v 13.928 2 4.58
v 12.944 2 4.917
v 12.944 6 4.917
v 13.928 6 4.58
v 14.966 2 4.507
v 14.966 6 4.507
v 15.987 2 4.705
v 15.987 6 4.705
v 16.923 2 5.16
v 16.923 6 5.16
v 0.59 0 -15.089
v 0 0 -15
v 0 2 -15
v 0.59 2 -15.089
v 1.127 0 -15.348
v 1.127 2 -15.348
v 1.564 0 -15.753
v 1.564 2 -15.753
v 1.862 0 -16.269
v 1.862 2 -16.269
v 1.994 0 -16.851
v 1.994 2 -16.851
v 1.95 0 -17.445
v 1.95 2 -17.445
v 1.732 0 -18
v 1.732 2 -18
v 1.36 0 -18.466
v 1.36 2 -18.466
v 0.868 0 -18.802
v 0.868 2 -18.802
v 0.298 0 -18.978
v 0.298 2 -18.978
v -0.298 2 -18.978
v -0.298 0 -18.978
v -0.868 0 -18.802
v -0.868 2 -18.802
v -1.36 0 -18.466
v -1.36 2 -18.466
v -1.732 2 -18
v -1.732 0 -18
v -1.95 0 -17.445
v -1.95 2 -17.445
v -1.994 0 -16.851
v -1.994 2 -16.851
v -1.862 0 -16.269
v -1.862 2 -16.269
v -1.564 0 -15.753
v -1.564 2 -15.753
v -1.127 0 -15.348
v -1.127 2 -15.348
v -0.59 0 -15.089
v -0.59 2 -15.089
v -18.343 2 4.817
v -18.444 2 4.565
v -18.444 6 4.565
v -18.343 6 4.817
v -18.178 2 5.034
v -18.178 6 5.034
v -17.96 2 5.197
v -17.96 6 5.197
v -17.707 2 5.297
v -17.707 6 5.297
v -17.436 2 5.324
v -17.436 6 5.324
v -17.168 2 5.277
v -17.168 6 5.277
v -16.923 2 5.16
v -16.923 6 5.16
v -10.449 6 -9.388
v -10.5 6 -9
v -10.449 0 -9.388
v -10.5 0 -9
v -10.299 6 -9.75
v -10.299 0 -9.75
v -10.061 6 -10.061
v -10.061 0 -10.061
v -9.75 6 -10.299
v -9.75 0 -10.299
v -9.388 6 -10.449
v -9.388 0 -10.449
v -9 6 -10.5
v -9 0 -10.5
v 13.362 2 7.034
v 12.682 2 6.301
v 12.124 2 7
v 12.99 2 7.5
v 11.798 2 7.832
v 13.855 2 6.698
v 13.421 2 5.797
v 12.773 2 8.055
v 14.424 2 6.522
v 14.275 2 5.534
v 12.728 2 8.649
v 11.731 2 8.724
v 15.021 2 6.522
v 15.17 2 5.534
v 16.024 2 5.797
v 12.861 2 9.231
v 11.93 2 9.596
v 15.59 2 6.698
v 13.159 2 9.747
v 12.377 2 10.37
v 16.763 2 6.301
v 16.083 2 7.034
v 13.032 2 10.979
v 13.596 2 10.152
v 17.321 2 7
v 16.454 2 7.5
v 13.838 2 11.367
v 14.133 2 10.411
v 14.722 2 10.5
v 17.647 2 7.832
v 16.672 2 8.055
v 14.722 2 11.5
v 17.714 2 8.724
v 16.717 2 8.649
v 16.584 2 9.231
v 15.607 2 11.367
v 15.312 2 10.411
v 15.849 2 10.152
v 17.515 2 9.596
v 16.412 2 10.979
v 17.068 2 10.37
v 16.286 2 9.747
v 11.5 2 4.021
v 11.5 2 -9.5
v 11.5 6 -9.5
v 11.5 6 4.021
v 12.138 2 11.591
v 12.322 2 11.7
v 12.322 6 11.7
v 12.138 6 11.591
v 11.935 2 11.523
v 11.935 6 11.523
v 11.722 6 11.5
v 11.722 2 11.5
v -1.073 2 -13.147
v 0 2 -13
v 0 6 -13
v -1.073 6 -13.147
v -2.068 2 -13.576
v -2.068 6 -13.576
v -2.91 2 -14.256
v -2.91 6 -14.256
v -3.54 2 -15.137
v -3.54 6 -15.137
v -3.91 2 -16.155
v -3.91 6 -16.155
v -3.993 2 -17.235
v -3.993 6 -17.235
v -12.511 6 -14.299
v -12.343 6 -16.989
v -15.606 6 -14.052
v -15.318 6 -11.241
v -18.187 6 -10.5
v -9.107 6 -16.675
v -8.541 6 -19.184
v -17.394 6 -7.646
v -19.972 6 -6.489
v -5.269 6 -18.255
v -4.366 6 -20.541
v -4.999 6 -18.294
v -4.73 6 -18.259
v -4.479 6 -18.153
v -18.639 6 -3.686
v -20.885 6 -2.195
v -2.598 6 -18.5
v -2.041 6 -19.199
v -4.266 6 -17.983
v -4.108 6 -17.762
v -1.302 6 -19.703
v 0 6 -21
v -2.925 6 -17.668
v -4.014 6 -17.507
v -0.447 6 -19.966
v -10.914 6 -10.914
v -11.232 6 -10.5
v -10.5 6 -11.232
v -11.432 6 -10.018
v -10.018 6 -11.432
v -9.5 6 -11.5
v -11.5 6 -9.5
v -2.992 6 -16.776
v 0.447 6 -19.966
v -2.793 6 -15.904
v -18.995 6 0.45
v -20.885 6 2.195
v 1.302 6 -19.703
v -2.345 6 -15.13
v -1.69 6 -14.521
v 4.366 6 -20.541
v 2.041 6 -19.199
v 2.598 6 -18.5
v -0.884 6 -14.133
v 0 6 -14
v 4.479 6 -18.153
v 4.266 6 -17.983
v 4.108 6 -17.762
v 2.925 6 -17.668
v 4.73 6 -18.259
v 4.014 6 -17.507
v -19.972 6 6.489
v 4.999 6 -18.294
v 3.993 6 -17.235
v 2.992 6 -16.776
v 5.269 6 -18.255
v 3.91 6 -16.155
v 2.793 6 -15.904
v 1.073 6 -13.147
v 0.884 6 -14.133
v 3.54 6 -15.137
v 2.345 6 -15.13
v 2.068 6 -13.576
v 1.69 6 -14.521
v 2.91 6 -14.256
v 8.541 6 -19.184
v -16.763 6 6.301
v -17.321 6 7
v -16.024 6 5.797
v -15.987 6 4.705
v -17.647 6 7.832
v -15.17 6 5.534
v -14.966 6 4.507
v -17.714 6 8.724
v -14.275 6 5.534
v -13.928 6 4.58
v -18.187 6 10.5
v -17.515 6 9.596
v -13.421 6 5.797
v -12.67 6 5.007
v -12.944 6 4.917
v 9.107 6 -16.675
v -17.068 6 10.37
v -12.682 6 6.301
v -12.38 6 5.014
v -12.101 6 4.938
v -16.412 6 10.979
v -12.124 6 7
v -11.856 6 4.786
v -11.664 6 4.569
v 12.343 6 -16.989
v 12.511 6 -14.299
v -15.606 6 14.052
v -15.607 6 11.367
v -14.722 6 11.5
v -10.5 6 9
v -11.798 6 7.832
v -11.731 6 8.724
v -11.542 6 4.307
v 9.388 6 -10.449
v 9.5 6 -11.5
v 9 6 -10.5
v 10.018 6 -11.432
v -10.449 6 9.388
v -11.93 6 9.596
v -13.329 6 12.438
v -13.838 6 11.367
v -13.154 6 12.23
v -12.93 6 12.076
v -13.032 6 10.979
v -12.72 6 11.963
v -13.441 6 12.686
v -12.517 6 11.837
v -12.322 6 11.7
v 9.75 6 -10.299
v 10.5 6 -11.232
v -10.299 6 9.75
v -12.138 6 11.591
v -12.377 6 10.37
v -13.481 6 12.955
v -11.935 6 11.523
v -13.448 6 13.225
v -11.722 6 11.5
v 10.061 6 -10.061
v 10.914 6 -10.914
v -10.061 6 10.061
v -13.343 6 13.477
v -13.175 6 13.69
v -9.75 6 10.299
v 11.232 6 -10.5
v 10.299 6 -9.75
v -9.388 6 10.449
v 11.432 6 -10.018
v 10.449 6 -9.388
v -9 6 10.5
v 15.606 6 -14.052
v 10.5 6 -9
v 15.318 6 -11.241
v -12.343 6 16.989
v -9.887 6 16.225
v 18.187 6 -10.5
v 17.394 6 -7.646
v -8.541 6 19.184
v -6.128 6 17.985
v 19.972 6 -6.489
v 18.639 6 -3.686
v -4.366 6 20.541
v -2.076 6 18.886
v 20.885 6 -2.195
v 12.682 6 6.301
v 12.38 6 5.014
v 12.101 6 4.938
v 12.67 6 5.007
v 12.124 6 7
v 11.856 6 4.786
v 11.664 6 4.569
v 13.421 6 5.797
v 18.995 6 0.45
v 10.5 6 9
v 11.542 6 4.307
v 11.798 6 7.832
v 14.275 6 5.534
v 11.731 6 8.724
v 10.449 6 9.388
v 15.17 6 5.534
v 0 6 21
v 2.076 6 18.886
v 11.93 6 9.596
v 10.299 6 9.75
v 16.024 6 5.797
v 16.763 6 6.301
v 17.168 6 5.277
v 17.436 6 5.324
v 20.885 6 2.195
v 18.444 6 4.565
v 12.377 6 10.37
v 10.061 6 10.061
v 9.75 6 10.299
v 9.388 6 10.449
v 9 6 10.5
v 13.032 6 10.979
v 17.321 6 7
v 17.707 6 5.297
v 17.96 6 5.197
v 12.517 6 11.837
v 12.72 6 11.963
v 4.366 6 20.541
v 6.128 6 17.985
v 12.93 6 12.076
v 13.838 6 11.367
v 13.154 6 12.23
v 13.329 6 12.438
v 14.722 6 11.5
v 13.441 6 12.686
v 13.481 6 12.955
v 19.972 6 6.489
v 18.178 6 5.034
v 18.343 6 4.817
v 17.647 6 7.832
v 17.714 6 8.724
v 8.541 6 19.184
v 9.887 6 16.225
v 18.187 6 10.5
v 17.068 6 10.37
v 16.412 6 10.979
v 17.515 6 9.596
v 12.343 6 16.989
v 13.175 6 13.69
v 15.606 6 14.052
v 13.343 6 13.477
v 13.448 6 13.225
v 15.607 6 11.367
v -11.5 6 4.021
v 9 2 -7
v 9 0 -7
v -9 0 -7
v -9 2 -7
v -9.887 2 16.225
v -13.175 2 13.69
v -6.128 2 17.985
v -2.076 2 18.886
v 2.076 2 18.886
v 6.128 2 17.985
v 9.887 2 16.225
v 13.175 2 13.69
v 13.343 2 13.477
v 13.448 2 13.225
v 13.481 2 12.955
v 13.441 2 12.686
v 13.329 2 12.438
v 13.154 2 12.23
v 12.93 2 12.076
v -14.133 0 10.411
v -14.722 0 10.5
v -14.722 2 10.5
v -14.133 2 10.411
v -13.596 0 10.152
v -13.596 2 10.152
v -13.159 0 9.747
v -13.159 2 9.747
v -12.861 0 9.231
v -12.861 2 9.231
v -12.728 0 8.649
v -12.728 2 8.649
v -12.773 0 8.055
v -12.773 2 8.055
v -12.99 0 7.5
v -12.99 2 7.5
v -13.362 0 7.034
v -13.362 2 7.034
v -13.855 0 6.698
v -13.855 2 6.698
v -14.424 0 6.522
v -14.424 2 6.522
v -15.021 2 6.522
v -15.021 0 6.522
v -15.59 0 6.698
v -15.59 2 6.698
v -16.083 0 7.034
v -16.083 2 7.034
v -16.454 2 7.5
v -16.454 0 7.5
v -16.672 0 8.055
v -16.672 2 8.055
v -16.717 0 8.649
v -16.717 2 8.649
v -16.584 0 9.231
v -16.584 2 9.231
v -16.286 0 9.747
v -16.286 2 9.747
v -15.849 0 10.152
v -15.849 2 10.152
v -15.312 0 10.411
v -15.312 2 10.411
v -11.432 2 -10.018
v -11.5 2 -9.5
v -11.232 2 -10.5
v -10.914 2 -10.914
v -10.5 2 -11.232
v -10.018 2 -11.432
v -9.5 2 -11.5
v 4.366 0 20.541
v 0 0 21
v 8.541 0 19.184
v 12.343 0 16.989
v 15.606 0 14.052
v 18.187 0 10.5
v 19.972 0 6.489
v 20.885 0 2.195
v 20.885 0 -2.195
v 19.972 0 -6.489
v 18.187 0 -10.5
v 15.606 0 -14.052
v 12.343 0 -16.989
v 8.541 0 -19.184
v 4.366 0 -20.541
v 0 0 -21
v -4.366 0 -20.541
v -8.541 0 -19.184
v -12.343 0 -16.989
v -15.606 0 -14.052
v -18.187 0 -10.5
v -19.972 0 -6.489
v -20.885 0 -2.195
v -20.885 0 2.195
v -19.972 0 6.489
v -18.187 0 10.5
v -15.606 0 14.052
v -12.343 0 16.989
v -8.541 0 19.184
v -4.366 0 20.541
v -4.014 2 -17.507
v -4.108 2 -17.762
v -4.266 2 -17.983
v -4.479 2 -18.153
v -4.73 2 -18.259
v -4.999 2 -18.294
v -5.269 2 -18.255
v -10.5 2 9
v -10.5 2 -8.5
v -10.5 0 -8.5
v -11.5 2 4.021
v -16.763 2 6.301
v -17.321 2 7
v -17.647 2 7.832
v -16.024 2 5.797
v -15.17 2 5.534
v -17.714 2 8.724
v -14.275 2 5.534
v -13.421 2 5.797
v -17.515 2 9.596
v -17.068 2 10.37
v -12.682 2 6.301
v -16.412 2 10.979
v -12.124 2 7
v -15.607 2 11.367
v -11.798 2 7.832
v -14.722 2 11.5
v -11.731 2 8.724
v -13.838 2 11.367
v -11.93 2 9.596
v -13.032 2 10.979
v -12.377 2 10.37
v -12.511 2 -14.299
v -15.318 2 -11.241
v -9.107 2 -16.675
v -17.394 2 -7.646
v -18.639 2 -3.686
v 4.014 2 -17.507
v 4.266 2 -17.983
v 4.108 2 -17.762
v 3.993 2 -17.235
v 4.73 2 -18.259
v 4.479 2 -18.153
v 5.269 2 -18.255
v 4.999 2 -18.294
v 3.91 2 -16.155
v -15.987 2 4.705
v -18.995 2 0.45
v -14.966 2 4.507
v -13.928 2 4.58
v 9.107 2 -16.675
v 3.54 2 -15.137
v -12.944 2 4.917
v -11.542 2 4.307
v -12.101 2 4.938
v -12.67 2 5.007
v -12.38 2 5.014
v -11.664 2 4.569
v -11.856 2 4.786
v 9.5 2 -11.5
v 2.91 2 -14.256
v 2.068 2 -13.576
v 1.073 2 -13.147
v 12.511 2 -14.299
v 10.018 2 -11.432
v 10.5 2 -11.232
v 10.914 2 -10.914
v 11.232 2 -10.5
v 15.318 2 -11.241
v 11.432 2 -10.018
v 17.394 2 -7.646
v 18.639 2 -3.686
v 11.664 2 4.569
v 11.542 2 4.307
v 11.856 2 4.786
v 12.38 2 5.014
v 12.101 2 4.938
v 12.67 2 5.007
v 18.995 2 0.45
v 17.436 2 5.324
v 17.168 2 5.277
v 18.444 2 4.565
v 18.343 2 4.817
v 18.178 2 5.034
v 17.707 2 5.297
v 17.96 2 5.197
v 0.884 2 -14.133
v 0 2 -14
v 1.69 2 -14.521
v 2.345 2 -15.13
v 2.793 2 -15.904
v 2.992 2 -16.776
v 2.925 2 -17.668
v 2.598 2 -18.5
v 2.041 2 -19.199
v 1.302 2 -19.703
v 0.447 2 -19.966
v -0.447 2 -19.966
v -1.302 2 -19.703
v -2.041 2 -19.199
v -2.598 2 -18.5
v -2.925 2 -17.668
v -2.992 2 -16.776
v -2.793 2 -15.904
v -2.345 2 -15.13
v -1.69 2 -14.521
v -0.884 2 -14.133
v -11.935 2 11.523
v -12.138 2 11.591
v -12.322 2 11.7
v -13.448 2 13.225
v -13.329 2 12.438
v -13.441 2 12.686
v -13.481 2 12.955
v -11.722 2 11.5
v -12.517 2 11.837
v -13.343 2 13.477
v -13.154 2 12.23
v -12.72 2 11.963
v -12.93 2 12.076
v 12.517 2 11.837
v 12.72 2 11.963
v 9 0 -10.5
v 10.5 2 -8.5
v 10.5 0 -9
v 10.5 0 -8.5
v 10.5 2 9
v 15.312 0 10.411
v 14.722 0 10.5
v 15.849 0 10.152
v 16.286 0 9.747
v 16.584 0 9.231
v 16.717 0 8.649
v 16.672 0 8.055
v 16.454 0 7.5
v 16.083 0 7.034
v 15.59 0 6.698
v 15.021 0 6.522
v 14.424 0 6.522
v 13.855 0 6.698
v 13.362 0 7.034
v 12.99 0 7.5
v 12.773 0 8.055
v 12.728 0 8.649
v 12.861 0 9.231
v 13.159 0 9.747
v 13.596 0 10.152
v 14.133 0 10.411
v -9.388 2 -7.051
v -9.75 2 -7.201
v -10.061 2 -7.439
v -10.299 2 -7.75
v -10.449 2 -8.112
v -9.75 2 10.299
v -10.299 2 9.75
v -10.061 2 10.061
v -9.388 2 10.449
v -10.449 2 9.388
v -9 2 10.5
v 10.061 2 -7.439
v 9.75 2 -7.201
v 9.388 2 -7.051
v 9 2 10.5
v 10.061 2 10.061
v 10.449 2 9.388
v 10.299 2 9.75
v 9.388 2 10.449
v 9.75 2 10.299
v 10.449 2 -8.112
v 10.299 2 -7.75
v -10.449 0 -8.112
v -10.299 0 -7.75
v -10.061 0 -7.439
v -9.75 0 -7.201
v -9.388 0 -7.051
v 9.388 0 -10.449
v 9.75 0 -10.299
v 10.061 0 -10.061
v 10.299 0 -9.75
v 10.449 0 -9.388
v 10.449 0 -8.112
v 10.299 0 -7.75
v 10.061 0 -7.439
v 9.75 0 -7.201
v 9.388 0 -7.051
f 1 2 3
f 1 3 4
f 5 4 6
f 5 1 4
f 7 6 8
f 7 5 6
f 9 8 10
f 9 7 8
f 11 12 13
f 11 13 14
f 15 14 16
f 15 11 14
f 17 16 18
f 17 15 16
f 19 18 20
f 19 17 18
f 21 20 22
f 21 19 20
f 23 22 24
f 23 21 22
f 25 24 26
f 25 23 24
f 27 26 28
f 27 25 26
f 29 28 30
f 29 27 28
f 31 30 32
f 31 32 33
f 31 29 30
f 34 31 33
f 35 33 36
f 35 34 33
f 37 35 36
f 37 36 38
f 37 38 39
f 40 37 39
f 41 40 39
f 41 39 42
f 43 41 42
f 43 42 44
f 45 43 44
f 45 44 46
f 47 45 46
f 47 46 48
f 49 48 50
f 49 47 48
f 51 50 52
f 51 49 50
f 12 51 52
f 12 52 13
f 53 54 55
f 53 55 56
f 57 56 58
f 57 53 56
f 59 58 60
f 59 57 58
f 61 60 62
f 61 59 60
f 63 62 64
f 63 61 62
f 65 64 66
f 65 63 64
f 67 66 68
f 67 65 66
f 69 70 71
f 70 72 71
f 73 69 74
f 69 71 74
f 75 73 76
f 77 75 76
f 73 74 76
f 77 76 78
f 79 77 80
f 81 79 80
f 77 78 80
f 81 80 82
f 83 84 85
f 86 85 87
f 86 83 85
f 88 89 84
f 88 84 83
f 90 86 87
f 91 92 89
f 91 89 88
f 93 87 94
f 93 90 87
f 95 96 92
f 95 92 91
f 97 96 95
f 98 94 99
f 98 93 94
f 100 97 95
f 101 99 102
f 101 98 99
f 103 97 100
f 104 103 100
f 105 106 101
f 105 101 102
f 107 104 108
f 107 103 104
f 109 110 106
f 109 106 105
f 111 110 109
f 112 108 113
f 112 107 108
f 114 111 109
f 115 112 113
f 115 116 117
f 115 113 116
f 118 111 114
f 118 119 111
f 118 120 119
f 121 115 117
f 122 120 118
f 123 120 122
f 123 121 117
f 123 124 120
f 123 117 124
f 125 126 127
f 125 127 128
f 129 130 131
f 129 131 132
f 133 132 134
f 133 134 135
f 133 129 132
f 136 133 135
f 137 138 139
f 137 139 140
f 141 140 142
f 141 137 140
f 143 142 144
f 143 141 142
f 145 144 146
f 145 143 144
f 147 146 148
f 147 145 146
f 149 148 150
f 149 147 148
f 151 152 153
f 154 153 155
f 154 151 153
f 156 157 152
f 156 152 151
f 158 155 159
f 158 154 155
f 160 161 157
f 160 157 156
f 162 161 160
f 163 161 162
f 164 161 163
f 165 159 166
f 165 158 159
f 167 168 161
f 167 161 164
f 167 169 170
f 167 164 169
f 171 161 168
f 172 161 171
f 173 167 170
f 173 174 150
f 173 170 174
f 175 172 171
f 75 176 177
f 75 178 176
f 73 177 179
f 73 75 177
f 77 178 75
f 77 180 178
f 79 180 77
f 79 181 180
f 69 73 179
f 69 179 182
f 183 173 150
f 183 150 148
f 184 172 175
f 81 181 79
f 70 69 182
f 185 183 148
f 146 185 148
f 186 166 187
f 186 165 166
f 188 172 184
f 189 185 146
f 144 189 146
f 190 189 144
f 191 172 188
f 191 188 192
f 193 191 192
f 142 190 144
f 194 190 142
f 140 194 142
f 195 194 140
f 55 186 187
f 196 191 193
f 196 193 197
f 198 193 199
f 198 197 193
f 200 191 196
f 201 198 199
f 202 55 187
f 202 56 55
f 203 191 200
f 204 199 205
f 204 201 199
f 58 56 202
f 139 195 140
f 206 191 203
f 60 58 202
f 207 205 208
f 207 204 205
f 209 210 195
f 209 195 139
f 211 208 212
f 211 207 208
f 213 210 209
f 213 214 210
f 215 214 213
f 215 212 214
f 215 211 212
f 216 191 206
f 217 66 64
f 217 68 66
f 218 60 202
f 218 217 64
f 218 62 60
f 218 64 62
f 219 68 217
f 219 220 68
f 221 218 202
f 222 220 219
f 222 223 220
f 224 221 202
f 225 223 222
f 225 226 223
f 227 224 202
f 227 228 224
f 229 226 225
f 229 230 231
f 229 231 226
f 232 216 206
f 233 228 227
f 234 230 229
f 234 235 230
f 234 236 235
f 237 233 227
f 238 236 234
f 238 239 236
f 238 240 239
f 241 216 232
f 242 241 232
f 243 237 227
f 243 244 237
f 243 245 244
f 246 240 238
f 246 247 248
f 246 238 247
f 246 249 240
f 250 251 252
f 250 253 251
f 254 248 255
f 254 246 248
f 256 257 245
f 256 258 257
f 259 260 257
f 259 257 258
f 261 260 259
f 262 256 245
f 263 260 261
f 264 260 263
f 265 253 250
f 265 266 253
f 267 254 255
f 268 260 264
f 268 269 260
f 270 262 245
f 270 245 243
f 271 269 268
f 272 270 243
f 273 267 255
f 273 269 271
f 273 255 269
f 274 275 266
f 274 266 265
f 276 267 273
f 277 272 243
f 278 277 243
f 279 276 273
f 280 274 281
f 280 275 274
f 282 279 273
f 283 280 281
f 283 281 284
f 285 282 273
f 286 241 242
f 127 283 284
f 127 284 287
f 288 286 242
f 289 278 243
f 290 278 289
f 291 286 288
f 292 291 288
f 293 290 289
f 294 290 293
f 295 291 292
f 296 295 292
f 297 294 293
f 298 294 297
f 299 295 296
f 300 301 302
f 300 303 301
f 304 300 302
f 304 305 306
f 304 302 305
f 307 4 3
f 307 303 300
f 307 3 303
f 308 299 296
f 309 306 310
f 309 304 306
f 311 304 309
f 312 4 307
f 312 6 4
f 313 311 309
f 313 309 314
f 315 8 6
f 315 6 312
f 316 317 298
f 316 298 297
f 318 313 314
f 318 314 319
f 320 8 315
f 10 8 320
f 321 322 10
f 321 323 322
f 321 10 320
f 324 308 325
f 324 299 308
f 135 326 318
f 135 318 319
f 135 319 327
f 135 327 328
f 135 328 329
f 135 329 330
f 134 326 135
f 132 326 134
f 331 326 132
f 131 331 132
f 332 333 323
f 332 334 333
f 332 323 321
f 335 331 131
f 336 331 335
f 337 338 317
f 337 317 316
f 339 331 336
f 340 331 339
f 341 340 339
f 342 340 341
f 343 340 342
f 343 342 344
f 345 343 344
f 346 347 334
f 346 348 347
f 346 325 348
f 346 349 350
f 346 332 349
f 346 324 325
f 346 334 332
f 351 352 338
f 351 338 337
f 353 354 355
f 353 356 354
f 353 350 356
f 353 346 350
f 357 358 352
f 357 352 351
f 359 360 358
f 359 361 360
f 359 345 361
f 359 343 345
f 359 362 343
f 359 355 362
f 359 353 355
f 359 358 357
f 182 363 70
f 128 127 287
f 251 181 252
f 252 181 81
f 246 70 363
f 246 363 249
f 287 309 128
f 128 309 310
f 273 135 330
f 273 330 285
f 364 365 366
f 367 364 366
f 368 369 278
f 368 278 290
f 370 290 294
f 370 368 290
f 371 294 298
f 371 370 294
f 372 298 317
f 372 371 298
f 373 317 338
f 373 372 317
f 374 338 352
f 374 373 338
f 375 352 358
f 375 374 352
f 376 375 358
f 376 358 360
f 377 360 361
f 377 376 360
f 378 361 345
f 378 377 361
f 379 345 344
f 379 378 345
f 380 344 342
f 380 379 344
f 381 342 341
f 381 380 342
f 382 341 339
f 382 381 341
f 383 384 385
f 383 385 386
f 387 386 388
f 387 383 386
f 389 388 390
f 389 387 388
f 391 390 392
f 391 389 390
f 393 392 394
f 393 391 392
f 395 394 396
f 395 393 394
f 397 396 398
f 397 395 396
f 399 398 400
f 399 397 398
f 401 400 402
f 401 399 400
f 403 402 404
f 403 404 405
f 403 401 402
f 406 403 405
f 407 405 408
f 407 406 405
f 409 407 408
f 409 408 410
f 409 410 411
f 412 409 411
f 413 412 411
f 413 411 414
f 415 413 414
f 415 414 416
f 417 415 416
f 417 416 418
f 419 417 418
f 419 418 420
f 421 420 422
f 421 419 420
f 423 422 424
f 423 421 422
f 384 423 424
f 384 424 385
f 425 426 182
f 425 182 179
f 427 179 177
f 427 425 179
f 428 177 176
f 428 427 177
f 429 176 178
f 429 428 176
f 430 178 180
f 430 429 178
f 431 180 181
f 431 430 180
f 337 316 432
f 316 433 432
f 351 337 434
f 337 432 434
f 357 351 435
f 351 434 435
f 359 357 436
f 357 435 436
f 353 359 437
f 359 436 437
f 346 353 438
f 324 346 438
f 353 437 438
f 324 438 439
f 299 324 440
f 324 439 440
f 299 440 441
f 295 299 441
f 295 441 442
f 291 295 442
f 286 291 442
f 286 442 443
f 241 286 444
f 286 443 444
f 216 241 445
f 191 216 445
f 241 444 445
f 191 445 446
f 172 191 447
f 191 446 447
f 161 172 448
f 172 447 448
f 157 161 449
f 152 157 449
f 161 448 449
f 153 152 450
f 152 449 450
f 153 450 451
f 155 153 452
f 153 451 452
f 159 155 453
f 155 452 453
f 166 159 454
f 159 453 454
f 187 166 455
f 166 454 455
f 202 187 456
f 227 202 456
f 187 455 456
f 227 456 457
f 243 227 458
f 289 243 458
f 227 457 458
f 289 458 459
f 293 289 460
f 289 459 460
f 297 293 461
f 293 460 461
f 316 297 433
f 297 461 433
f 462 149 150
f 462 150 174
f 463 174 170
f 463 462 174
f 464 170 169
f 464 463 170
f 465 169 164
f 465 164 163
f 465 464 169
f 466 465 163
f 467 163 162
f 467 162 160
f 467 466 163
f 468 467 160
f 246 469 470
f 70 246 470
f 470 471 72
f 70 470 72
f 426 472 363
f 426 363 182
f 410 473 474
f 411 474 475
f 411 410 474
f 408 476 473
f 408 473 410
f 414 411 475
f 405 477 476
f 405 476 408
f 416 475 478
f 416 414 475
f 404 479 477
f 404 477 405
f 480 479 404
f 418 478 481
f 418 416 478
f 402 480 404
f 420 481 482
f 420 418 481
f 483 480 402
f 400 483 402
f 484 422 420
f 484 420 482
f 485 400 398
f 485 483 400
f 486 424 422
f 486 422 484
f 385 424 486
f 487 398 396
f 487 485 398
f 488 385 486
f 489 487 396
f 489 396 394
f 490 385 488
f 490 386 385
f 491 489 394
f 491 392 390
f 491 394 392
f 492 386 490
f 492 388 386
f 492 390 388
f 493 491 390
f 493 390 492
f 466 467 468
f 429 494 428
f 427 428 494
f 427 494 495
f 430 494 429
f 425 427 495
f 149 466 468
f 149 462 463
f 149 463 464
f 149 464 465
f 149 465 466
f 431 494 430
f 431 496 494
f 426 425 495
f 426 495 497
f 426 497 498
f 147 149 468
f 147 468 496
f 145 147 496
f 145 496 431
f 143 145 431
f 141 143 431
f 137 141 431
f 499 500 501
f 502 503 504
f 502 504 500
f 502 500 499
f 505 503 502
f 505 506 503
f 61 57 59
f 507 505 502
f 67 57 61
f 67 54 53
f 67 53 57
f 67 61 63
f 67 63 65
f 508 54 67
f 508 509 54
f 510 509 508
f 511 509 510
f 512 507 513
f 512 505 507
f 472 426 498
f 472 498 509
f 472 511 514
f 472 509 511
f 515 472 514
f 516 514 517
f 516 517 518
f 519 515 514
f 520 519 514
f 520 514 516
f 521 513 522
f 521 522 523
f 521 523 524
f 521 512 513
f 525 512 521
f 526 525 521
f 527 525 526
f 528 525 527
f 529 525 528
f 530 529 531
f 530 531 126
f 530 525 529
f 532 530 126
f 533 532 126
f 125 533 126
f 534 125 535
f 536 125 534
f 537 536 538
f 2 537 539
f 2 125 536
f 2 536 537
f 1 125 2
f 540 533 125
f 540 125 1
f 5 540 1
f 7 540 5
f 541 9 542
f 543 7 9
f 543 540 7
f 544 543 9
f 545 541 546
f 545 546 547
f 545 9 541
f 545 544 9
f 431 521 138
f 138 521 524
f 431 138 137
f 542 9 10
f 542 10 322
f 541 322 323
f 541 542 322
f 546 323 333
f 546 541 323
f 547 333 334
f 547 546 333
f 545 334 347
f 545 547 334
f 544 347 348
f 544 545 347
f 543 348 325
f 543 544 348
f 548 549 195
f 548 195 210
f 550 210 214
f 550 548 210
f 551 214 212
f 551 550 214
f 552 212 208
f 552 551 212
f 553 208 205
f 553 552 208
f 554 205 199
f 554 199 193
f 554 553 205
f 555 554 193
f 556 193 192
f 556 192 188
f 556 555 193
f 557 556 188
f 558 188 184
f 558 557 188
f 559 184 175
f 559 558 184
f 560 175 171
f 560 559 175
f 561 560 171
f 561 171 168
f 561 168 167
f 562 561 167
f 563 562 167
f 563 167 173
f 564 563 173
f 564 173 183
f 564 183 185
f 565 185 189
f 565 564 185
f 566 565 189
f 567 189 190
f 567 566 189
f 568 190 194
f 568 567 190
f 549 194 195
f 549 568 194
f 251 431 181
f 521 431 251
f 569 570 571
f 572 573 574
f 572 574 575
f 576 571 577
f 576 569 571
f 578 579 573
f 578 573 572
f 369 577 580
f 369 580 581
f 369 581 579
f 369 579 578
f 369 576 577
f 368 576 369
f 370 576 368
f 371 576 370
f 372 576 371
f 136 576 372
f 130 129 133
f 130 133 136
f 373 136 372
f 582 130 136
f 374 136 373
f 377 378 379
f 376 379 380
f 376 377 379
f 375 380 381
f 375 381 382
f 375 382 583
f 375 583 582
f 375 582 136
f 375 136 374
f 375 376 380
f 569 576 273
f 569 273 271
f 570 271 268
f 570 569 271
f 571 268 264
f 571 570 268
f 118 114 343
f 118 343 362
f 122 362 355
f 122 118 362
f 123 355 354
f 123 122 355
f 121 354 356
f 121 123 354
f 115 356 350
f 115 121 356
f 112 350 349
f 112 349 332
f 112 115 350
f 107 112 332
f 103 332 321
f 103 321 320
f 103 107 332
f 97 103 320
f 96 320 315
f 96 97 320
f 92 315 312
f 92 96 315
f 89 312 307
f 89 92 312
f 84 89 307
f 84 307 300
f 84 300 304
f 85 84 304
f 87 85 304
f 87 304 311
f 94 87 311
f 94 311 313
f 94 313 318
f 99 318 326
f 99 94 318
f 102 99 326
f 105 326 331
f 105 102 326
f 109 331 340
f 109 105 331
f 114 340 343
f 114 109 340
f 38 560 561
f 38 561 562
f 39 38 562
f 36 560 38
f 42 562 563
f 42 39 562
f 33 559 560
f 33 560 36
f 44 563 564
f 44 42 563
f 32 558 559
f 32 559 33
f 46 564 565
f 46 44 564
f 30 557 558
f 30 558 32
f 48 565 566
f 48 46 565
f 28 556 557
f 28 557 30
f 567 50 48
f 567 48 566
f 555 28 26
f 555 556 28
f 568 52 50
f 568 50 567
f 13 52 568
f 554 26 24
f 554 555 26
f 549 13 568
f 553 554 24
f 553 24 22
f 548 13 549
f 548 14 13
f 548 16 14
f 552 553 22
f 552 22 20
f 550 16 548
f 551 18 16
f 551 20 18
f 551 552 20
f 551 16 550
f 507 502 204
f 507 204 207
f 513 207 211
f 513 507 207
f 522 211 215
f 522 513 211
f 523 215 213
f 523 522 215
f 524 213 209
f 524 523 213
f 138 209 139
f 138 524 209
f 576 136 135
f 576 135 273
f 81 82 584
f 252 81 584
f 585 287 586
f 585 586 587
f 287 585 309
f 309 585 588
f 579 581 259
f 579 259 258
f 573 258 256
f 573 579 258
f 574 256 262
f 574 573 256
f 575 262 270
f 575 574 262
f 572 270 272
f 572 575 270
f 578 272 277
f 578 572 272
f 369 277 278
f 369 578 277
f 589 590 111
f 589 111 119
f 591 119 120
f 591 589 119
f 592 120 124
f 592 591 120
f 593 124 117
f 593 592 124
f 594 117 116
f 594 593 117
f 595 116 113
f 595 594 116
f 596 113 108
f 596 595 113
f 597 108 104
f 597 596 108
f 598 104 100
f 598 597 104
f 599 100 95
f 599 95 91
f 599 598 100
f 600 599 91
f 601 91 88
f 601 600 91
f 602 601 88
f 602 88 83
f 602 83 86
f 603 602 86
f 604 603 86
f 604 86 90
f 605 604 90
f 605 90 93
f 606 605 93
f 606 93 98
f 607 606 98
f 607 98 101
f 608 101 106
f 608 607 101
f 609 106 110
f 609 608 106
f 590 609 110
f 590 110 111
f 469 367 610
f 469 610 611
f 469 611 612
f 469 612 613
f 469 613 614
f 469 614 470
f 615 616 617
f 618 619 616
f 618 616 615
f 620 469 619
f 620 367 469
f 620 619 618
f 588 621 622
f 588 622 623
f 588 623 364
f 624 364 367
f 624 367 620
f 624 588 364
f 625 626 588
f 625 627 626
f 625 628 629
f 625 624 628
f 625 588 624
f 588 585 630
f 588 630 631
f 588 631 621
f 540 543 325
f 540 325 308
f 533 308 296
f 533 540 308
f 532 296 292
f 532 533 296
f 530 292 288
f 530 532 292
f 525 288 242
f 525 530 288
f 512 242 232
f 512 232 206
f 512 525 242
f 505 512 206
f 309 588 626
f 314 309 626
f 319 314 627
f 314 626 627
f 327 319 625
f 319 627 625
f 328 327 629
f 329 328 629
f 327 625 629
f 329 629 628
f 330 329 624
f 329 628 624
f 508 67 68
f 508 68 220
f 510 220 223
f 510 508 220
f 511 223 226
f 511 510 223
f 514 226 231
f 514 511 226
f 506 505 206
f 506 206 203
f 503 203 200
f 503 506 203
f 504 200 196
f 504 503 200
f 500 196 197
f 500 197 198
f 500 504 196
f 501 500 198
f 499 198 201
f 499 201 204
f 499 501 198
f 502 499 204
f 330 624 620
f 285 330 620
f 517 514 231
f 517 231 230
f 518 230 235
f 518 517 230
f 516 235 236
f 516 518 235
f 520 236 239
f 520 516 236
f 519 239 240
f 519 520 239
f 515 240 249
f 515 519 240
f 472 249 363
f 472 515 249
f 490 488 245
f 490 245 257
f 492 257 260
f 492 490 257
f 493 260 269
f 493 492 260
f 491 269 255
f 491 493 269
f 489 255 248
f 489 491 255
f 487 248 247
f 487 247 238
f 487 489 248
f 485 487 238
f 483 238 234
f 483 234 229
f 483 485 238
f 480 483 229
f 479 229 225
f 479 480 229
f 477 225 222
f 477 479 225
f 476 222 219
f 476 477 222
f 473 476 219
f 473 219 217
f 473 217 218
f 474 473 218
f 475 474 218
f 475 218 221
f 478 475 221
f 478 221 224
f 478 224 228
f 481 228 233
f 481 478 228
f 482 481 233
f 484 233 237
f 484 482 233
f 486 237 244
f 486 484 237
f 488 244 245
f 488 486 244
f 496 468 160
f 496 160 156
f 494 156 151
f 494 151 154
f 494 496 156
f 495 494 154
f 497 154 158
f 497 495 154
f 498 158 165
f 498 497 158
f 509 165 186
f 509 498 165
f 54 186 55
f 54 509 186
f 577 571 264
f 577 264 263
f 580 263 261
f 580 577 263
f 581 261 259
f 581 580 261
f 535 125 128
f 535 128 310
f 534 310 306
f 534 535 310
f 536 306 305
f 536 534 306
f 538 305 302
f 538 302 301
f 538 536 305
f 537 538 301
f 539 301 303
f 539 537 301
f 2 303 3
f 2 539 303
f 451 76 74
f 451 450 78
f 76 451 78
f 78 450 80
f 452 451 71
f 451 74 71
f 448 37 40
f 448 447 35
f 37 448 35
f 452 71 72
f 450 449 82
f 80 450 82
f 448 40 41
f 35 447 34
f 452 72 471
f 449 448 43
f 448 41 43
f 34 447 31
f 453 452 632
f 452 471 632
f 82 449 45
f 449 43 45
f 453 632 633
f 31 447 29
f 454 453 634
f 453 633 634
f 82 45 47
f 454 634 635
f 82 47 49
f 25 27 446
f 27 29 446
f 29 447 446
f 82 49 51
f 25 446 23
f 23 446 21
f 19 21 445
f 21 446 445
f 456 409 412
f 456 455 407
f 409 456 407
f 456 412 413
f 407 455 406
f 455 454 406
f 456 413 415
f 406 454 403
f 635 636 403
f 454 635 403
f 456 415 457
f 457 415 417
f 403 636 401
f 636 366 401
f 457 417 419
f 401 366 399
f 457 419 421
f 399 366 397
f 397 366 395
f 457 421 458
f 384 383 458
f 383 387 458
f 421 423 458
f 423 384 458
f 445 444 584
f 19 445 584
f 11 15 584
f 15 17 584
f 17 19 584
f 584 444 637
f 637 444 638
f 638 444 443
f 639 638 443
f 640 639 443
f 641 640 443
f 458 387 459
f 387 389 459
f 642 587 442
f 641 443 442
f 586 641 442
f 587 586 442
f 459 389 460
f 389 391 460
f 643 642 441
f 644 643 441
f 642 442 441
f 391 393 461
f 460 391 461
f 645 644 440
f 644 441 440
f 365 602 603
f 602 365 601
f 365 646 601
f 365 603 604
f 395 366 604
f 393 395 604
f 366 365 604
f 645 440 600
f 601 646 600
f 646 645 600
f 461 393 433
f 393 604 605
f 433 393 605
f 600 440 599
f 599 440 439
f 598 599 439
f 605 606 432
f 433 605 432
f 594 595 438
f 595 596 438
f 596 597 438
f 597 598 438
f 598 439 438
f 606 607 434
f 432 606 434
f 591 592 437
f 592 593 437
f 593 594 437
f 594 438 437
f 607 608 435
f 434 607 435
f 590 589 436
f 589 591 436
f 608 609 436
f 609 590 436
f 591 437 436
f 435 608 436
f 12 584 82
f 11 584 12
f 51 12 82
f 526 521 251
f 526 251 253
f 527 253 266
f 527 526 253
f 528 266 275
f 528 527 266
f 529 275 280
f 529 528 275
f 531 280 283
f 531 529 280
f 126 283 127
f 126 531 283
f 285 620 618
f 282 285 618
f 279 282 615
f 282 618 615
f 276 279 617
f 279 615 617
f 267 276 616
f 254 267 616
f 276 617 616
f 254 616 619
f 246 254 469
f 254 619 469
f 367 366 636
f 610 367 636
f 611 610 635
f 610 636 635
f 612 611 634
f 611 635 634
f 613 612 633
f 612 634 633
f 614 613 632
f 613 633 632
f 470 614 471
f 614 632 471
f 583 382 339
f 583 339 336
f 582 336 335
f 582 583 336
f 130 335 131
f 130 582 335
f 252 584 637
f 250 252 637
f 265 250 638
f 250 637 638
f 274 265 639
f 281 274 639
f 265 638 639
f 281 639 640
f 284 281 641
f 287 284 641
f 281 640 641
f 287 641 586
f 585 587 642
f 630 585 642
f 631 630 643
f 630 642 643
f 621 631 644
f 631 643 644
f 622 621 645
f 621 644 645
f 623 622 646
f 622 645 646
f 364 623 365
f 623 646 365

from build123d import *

# Parameters (mm, degrees)
SKETCH1_R           = 21
BOSS_EXTRUDE1_DEPTH = 2
SKETCH2_R           = 21
SKETCH2_R_2         = 3
BOSS_EXTRUDE2_DEPTH = 4
CUT_EXTRUDE1_START  = -2
SKETCH3_R           = 2
CUT_EXTRUDE1_DEPTH  = 2


with BuildPart() as part:
    # Sketch1 → Boss-Extrude1 (new body)
    with BuildSketch(Plane(origin=(0, 0, 0), x_dir=(1, 0, 0), z_dir=(0, 1, 0))):
        with Locations(Location((0, 0, 0), (0, 0, 270))):
            Circle(SKETCH1_R)
    extrude(amount=BOSS_EXTRUDE1_DEPTH)

    # Sketch2 → Boss-Extrude2 (add)
    with BuildSketch(Plane(origin=(0, 2, 0), x_dir=(1, 0, 0), z_dir=(0, 1, 0))):
        with Locations(Location((0, 0, 0), (0, 0, 270))):
            Circle(SKETCH2_R)
        with Locations(Location((0, 17, 0), (0, 0, 270))):
            Circle(SKETCH2_R_2, mode=Mode.SUBTRACT)
        with Locations(Location((14.722431864, -8.5, 0), (0, 0, 270))):
            Circle(SKETCH2_R_2, mode=Mode.SUBTRACT)
        with Locations(Location((-14.722431864, -8.5, 0), (0, 0, 270))):
            Circle(SKETCH2_R_2, mode=Mode.SUBTRACT)
        with BuildLine():
            Line((-11.5, -4.021071935), (-11.5, 9.5))
            ThreePointArc((-11.5, 9.5), (-10.914213562, 10.914213562), (-9.5, 11.5))
            Line((-9.5, 11.5), (9.5, 11.5))
            ThreePointArc((9.5, 11.5), (10.914213562, 10.914213562), (11.5, 9.5))
            Line((11.5, 9.5), (11.5, -4.021071935))
            ThreePointArc((11.5, -4.021071935), (11.972973612, -4.870920855), (12.944486373, -4.916857548))
            ThreePointArc((12.944486373, -4.916857548), (14.965992077, -4.507422083), (16.922739342, -5.159543893))
            ThreePointArc((16.922739342, -5.159543893), (17.83709693, -5.255719057), (18.443528223, -4.564675969))
            ThreePointArc((18.443528223, -4.564675969), (16.454482672, 9.5), (5.268638762, 18.254901961))
            ThreePointArc((5.268638762, 18.254901961), (4.366962246, 18.075238599), (3.993073588, 17.235294118))
            ThreePointArc((3.993073588, 17.235294118), (2.9104275, 14.256022638), (0, 13))
            ThreePointArc((0, 13), (-2.9104275, 14.256022638), (-3.993073588, 17.235294118))
            ThreePointArc((-3.993073588, 17.235294118), (-4.366962246, 18.075238599), (-5.268638762, 18.254901961))
            ThreePointArc((-5.268638762, 18.254901961), (-16.454482672, 9.5), (-18.443528223, -4.564675969))
            ThreePointArc((-18.443528223, -4.564675969), (-17.83709693, -5.255719057), (-16.922739342, -5.159543893))
            ThreePointArc((-16.922739342, -5.159543893), (-14.965992077, -4.507422083), (-12.944486373, -4.916857548))
            ThreePointArc((-12.944486373, -4.916857548), (-11.972973612, -4.870920855), (-11.5, -4.021071935))
        make_face(mode=Mode.SUBTRACT)
        with BuildLine():
            Line((9, -10.5), (-9, -10.5))
            ThreePointArc((-9, -10.5), (-10.060660172, -10.060660172), (-10.5, -9))
            Line((-10.5, -9), (-10.5, 9))
            ThreePointArc((-10.5, 9), (-10.060660172, 10.060660172), (-9, 10.5))
            Line((-9, 10.5), (9, 10.5))
            ThreePointArc((9, 10.5), (10.060660172, 10.060660172), (10.5, 9))
            Line((10.5, 9), (10.5, -9))
            ThreePointArc((10.5, -9), (10.060660172, -10.060660172), (9, -10.5))
        make_face(mode=Mode.SUBTRACT)
        with BuildLine():
            Line((11.5, -11.5), (-11.5, -11.5))
            Line((-11.5, -11.5), (-11.722431864, -11.5))
            ThreePointArc((-11.722431864, -11.5), (-12.03865963, -11.551316702), (-12.322431864, -11.7))
            ThreePointArc((-12.322431864, -11.7), (-12.617647084, -11.901452782), (-12.929665754, -12.075750225))
            ThreePointArc((-12.929665754, -12.075750225), (-13.470134683, -12.819519543), (-13.174889461, -13.690225991))
            ThreePointArc((-13.174889461, -13.690225991), (0, -19), (13.174889461, -13.690225991))
            ThreePointArc((13.174889461, -13.690225991), (13.470134683, -12.819519543), (12.929665754, -12.075750225))
            ThreePointArc((12.929665754, -12.075750225), (12.617647084, -11.901452782), (12.322431864, -11.7))
            ThreePointArc((12.322431864, -11.7), (12.03865963, -11.551316702), (11.722431864, -11.5))
            Line((11.722431864, -11.5), (11.5, -11.5))
        make_face(mode=Mode.SUBTRACT)
    extrude(amount=BOSS_EXTRUDE2_DEPTH)

    # Sketch3 → Cut-Extrude1 (cut)
    with BuildSketch(Plane(origin=(0, 2, 0), x_dir=(1, 0, 0), z_dir=(0, 1, 0)).offset(CUT_EXTRUDE1_START)):
        with Locations(Location((0, 17, 0), (0, 0, 270))):
            Circle(SKETCH3_R)
        with Locations(Location((14.722431864, -8.5, 0), (0, 0, 270))):
            Circle(SKETCH3_R)
        with Locations(Location((-14.722431864, -8.5, 0), (0, 0, 270))):
            Circle(SKETCH3_R)
        with BuildLine():
            Line((9, 7), (-9, 7))
            ThreePointArc((-9, 7), (-10.060660172, 7.439339828), (-10.5, 8.5))
            Line((-10.5, 8.5), (-10.5, 9))
            ThreePointArc((-10.5, 9), (-10.060660172, 10.060660172), (-9, 10.5))
            Line((-9, 10.5), (9, 10.5))
            ThreePointArc((9, 10.5), (10.060660172, 10.060660172), (10.5, 9))
            Line((10.5, 9), (10.5, 8.5))
            ThreePointArc((10.5, 8.5), (10.060660172, 7.439339828), (9, 7))
        make_face()
    extrude(amount=CUT_EXTRUDE1_DEPTH, mode=Mode.SUBTRACT)


solid = part.part
